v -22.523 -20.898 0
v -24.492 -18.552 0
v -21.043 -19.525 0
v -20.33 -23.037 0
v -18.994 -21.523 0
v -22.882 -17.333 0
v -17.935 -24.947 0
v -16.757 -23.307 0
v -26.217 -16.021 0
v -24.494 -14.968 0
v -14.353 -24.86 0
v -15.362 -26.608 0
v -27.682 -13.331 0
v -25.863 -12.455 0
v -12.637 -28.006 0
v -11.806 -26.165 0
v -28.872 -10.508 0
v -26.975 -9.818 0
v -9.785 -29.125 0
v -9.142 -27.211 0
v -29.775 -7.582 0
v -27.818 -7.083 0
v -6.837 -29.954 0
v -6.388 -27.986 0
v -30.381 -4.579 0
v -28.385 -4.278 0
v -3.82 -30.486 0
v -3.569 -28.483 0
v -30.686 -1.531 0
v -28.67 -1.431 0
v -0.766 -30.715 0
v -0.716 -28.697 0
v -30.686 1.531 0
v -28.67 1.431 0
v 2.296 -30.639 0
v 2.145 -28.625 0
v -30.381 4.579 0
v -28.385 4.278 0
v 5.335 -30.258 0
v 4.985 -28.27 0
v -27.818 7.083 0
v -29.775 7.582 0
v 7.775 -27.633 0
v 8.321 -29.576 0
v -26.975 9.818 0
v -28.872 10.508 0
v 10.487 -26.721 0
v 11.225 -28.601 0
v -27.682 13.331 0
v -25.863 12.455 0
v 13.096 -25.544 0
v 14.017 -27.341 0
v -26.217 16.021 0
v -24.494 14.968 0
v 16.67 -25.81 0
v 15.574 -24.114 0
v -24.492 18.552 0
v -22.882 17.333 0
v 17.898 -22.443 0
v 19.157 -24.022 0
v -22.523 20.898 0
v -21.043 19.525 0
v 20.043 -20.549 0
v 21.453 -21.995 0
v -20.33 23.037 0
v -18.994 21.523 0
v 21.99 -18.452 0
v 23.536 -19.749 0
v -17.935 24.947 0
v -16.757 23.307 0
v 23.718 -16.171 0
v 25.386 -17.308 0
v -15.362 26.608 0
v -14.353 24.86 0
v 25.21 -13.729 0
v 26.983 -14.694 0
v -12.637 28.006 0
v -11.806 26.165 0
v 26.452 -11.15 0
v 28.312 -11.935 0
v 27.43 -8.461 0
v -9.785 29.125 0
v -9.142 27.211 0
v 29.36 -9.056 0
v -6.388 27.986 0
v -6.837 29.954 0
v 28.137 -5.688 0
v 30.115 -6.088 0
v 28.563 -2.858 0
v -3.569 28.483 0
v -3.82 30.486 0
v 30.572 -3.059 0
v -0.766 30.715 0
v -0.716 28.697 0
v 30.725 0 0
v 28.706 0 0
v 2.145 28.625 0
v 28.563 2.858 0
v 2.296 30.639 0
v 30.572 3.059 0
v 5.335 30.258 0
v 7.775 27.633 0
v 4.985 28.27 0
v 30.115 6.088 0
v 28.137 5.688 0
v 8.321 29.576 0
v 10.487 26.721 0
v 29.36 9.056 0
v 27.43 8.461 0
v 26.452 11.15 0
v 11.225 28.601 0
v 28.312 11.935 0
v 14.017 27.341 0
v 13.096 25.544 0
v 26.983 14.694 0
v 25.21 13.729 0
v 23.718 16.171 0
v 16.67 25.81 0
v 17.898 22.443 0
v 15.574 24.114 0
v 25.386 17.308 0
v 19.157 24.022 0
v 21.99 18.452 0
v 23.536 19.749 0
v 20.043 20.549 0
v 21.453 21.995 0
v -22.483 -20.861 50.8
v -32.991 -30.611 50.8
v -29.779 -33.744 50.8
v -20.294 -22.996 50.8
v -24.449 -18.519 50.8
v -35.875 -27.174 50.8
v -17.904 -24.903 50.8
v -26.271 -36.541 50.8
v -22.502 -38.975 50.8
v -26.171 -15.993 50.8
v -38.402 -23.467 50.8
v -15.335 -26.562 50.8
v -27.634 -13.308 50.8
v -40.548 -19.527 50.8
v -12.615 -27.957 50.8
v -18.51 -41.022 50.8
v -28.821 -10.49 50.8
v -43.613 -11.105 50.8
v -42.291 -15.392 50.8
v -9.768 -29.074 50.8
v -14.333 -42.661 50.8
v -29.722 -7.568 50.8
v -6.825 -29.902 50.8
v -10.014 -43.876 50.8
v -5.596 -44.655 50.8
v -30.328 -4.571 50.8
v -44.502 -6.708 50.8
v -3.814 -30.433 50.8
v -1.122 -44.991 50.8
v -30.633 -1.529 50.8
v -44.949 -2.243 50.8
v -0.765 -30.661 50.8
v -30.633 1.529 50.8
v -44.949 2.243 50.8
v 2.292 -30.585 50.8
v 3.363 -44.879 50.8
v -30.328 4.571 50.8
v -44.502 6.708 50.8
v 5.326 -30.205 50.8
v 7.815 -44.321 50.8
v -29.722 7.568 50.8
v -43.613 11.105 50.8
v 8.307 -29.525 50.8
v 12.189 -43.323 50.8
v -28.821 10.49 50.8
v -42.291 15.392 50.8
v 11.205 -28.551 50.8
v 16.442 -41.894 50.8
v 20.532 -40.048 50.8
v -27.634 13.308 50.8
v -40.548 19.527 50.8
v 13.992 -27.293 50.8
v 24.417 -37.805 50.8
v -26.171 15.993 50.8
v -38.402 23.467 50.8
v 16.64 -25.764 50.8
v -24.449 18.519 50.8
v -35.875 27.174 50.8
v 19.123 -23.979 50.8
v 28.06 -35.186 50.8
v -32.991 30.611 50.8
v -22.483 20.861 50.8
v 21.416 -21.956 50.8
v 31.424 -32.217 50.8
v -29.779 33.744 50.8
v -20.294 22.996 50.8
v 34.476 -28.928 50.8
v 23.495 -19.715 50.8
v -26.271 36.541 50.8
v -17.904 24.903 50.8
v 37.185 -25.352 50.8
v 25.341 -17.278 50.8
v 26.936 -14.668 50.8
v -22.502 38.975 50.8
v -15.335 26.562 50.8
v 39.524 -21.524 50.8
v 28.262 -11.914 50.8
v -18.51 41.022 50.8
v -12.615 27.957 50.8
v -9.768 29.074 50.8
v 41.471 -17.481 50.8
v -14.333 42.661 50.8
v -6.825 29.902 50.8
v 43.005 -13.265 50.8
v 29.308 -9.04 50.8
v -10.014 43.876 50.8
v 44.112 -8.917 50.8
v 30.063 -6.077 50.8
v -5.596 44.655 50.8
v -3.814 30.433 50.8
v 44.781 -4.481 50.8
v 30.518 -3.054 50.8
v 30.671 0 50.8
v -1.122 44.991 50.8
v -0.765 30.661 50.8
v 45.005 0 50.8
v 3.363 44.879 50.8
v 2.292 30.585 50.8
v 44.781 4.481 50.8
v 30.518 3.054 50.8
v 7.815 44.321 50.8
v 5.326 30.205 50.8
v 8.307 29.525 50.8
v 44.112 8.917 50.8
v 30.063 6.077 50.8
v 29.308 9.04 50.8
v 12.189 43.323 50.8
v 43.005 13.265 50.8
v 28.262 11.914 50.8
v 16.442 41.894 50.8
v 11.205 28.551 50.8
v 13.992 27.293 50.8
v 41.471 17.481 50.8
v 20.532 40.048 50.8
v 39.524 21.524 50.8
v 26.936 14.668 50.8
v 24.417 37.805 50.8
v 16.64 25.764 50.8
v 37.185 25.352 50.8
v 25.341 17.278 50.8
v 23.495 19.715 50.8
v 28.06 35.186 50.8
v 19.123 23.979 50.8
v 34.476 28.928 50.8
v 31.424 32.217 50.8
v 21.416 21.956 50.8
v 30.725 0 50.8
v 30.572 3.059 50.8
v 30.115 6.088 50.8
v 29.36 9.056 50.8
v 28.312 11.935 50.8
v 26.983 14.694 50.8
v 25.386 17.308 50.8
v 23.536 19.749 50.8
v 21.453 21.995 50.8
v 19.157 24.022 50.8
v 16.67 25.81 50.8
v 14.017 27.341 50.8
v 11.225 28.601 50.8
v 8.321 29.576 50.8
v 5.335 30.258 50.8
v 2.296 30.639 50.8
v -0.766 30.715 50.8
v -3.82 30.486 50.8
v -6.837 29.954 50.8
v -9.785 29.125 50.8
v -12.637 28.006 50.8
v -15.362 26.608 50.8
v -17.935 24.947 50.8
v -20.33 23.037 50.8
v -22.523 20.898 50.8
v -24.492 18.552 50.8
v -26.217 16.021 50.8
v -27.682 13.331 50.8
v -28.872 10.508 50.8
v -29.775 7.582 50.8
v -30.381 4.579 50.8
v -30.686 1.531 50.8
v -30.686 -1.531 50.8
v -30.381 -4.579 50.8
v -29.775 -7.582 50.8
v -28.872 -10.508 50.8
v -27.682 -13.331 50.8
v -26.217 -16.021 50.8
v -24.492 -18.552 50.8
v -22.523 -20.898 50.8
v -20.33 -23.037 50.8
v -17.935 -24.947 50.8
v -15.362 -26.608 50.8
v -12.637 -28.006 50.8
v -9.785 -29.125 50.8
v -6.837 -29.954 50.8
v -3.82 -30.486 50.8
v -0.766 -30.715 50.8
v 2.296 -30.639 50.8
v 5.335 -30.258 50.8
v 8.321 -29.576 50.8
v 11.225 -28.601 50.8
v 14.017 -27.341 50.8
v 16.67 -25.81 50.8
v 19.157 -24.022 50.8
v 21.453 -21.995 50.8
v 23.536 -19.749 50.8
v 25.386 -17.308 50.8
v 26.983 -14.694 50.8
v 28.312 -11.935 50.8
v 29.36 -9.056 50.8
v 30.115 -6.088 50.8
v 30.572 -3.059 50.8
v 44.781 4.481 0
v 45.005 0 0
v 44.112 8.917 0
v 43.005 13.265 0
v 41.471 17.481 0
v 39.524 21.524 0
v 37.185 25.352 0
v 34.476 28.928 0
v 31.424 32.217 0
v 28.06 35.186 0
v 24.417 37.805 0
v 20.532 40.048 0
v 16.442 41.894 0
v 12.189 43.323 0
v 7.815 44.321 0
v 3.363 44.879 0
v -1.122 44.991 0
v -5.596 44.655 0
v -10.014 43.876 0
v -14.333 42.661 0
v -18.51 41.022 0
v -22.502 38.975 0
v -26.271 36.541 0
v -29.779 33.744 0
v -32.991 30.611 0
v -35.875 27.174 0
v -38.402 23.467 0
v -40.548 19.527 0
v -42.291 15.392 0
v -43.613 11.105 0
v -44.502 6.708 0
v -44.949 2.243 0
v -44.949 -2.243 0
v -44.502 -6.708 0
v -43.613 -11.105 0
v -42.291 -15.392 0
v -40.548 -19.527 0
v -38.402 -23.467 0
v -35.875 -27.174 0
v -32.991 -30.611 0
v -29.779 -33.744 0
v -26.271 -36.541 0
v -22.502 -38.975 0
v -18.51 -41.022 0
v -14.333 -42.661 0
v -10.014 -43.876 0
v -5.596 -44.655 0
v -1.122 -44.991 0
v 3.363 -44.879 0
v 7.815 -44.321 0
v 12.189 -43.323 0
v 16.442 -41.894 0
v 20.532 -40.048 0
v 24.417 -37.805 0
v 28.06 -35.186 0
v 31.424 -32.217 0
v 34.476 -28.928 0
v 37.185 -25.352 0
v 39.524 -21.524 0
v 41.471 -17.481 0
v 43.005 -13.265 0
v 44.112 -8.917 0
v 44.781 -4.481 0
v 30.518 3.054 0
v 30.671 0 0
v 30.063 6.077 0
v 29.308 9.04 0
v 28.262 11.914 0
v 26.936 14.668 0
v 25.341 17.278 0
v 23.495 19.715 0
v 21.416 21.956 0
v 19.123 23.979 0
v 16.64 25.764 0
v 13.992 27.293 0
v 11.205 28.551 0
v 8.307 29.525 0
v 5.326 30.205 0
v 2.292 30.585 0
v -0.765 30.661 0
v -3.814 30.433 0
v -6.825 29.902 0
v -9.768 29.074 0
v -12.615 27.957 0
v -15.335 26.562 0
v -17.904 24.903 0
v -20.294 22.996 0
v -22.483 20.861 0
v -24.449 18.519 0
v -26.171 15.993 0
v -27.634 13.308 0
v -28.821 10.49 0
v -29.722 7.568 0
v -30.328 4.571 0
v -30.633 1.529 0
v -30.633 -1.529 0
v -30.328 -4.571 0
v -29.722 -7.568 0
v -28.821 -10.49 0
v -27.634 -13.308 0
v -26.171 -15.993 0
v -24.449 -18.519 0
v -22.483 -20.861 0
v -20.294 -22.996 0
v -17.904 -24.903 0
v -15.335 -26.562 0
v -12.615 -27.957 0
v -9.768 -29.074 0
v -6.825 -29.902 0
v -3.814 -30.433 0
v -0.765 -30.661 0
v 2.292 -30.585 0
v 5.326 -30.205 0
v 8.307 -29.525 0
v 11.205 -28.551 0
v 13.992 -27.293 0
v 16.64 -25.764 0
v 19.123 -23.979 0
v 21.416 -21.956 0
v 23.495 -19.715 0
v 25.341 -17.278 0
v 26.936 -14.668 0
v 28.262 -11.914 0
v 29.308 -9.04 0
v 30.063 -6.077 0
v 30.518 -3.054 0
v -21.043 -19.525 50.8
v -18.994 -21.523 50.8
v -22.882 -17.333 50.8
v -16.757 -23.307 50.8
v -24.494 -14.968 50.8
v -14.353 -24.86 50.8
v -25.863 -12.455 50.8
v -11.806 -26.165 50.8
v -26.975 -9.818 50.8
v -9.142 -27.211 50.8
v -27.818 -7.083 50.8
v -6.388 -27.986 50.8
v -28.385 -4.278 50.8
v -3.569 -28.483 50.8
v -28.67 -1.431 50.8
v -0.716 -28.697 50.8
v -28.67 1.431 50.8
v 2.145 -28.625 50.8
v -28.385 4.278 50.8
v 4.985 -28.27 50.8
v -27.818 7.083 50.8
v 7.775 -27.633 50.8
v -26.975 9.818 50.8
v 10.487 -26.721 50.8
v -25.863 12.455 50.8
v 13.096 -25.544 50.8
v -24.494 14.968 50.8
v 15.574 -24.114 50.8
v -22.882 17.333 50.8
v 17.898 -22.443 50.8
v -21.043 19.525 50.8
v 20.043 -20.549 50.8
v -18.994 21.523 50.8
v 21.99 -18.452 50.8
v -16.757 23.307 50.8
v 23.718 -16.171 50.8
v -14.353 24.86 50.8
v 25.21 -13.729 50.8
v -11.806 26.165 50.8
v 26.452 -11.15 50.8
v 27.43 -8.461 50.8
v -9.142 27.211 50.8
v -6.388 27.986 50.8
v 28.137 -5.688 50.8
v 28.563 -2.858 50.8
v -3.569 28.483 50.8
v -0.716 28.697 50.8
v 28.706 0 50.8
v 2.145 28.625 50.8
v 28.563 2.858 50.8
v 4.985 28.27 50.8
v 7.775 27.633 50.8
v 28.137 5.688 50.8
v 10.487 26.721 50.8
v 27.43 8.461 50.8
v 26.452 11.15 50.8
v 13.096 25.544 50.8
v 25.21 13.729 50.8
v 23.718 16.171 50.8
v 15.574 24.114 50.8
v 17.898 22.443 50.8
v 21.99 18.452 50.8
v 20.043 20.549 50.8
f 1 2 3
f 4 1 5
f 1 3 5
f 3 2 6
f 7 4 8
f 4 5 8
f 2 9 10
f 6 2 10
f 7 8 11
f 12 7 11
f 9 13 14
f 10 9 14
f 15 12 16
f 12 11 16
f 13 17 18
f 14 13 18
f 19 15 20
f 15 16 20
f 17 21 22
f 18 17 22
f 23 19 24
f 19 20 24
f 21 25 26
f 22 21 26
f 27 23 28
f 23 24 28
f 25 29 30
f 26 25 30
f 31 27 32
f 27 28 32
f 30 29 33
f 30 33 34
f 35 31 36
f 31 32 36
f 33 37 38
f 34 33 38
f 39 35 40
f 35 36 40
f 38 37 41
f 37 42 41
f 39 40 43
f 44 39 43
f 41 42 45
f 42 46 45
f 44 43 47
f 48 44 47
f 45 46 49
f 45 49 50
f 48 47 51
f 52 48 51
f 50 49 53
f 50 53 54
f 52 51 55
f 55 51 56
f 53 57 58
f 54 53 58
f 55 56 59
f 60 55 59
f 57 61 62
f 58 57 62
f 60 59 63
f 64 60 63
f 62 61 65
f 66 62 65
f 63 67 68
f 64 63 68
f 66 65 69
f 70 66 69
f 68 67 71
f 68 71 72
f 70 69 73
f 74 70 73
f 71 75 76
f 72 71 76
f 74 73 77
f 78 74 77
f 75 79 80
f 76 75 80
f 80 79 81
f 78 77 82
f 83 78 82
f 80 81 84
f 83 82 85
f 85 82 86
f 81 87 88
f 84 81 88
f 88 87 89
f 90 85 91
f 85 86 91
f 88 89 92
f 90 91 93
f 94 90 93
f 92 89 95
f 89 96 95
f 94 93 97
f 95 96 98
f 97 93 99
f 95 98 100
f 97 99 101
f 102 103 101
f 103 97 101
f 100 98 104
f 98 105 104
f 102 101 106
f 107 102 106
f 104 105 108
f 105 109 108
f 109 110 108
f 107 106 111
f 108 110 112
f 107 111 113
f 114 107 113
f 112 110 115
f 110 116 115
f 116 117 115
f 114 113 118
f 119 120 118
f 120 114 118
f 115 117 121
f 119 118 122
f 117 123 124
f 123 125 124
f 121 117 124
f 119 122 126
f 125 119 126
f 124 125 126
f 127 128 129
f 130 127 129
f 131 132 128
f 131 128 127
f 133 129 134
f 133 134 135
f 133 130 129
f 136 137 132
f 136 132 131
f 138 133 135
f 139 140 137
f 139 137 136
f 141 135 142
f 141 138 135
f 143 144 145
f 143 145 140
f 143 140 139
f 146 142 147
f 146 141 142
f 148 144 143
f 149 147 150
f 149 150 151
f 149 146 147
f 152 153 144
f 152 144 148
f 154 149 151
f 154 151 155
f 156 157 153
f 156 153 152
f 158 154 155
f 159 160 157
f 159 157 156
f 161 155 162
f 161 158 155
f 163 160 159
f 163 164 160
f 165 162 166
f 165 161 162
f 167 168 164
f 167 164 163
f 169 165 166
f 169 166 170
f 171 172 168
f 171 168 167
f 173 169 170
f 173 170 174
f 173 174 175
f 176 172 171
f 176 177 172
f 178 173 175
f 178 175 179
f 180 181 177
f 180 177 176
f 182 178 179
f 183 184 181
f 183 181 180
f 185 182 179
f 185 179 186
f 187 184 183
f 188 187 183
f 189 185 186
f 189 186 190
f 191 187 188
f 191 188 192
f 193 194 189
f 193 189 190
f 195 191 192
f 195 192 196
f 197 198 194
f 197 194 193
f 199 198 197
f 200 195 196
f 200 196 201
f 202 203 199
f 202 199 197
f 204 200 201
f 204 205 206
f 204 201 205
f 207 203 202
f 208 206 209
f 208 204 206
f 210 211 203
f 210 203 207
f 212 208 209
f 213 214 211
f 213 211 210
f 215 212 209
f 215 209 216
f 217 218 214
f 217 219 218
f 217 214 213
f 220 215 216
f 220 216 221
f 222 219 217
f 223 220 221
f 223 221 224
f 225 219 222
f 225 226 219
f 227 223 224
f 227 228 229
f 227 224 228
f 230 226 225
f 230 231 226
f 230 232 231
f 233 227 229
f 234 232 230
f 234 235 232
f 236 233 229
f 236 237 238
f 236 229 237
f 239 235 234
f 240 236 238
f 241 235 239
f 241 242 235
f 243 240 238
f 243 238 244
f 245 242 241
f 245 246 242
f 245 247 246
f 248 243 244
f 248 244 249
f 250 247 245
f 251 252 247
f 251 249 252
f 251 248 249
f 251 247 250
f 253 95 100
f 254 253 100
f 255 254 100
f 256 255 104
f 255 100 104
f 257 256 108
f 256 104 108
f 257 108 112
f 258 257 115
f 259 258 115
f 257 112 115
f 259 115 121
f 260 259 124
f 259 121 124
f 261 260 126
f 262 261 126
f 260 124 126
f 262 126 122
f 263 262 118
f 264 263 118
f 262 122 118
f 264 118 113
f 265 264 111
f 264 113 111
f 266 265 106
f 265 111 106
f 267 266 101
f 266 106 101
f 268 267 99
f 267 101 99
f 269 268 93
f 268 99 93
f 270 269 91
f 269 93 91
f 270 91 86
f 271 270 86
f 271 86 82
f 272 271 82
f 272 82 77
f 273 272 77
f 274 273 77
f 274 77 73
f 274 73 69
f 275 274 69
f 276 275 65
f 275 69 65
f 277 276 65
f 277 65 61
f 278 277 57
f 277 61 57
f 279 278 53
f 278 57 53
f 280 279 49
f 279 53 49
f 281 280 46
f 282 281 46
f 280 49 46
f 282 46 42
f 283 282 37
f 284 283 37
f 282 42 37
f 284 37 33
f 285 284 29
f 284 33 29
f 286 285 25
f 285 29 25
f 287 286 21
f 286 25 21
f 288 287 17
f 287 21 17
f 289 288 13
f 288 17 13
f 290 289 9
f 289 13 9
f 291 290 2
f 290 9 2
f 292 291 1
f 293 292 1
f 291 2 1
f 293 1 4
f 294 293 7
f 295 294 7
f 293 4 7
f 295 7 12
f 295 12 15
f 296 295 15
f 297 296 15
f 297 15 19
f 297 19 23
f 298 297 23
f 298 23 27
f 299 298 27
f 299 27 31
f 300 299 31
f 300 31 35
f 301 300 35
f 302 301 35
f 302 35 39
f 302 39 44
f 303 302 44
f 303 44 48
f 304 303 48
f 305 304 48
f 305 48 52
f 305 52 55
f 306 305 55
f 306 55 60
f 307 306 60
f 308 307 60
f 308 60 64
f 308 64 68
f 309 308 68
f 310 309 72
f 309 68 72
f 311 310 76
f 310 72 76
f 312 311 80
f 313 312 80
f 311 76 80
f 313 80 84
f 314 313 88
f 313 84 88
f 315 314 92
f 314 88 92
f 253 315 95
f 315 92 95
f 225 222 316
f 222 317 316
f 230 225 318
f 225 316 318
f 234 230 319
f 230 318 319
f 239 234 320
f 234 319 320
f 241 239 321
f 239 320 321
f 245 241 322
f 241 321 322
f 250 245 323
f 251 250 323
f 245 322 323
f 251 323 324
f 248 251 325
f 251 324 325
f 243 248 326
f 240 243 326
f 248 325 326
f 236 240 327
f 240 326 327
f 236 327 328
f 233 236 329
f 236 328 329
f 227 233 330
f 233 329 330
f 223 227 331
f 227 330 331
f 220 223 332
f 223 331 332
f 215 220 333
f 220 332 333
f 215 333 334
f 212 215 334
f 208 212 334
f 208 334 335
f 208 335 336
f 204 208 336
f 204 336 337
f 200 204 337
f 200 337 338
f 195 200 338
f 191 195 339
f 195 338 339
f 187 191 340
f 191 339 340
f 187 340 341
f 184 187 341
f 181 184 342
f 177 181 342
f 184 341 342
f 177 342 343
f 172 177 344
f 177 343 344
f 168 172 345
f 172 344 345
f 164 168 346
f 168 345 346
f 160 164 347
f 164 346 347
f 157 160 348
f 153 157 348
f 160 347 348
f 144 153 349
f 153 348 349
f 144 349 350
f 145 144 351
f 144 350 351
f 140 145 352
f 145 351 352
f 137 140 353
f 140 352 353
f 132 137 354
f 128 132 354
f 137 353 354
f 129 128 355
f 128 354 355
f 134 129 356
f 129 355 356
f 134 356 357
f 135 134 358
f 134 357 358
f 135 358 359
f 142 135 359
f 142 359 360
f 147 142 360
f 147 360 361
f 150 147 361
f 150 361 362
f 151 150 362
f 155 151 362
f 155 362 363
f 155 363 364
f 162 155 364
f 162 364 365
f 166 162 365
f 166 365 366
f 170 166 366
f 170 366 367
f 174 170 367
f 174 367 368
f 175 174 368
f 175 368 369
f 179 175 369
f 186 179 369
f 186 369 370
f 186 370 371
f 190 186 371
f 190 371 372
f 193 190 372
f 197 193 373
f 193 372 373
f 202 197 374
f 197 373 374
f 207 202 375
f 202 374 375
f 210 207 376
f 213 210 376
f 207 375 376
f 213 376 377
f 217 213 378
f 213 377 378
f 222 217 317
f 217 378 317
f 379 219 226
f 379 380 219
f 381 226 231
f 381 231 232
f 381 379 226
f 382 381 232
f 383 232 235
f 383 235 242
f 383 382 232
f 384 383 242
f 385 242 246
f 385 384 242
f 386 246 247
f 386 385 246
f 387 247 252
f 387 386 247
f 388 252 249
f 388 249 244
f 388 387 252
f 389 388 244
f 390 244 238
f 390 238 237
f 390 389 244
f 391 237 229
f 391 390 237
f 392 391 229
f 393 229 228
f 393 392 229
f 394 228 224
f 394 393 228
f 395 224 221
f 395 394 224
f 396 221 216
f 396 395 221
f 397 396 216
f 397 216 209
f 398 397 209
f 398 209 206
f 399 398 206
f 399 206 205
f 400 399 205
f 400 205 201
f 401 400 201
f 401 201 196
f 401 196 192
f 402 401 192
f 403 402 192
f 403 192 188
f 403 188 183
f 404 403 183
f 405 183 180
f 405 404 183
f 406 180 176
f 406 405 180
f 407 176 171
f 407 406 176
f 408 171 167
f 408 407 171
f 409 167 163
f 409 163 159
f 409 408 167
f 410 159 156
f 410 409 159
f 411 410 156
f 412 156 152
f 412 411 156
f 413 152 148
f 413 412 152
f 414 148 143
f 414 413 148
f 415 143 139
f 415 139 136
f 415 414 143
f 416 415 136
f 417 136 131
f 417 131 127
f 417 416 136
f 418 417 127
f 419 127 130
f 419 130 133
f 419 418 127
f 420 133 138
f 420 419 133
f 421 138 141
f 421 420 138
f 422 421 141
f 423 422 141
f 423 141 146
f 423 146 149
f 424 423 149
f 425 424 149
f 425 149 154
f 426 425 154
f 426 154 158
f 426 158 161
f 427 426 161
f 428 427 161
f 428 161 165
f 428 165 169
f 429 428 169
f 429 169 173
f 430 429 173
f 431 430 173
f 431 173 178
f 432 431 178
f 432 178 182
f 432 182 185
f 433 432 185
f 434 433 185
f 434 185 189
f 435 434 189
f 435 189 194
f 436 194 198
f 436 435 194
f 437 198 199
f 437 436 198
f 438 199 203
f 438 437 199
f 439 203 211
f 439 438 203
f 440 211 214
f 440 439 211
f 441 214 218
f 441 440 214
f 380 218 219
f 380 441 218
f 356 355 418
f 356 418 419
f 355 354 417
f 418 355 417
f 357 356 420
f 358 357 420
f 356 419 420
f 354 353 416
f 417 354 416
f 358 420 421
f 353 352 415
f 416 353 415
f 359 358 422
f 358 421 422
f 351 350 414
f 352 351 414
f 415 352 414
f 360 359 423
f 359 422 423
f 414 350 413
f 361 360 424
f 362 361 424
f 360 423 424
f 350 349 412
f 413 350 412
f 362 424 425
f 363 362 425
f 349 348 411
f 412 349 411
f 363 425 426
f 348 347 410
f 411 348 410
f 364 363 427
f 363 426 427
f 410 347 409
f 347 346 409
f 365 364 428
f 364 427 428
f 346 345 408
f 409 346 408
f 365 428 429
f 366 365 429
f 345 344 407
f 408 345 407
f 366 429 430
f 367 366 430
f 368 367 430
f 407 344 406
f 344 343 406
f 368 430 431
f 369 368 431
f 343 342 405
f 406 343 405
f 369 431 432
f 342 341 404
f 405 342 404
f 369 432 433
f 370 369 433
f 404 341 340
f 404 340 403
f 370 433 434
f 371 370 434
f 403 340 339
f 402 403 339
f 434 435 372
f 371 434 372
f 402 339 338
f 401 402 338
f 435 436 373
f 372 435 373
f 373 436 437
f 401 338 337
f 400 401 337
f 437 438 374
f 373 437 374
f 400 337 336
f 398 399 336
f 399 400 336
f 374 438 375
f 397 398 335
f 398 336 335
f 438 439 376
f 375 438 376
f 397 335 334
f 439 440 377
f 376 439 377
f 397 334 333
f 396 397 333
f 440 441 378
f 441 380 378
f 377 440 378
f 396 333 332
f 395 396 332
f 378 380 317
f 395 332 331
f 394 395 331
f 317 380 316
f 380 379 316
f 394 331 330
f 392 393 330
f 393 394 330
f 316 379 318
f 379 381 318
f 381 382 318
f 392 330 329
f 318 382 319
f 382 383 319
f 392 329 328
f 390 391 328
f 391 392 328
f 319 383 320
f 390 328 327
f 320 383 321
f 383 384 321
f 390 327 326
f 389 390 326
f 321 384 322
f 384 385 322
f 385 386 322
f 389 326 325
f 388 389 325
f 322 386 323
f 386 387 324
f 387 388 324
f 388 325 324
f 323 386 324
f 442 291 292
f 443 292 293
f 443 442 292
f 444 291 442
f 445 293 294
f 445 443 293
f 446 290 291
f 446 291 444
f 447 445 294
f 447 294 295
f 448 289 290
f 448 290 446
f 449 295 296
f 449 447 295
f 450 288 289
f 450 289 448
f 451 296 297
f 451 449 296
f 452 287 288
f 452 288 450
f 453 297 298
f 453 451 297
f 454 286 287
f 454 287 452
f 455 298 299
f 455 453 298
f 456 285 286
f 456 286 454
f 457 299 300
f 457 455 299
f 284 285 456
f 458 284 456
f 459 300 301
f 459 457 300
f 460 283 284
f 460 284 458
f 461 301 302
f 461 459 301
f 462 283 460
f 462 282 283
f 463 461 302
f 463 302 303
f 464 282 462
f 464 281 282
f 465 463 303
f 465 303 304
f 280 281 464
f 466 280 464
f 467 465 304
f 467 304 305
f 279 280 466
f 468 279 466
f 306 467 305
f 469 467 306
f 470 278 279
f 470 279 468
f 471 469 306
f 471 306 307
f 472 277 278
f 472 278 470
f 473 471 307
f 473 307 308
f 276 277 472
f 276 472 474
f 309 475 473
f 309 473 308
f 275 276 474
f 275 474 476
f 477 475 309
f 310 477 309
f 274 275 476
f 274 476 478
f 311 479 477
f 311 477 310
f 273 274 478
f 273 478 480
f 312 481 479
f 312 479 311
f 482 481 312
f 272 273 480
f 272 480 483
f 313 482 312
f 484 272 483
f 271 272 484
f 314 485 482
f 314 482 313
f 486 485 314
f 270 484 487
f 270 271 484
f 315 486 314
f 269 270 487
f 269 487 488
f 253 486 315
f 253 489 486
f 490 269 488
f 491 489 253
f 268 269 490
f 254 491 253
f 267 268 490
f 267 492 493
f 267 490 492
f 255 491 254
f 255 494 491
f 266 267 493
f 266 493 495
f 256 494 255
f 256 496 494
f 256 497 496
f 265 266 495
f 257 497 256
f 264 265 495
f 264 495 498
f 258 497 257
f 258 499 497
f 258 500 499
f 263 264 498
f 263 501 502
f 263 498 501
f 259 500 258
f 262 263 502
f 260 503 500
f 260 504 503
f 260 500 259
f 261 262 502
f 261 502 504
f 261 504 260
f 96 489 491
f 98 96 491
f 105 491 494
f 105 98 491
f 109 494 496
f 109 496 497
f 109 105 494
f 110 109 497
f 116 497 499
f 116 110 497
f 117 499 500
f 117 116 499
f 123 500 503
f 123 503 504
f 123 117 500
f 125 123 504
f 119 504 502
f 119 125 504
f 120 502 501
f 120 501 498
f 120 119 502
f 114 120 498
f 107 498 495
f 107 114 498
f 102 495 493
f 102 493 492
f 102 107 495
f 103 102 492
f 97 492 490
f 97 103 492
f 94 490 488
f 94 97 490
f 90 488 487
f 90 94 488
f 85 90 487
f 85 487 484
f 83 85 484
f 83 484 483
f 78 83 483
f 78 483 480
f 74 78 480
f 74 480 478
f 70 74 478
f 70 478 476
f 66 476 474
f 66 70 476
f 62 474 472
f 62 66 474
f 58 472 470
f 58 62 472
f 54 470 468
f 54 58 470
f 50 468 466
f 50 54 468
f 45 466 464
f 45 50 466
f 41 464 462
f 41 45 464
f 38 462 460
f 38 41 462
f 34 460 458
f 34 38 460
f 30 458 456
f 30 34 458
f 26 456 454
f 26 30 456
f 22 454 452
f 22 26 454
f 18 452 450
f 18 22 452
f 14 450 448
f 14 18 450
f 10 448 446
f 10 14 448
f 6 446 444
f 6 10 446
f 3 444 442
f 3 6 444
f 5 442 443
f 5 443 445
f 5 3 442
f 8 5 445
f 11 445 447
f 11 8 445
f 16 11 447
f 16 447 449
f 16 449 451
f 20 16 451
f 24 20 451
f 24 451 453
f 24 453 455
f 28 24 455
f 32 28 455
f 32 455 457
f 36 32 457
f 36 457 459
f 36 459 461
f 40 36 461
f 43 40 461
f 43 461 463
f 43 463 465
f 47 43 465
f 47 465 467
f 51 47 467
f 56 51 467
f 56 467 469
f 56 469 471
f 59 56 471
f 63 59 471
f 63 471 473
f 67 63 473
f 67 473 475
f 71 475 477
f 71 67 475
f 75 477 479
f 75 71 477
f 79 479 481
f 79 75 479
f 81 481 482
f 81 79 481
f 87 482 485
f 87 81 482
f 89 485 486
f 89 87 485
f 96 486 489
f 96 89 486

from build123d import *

# Parameters (mm, degrees)
F0_R        = 45.004612
F0_R_2      = 30.670883
F1_DEPTH    = 25.4
F1_FACE_R   = 45.004612
F1_FACE_R_2 = 30.670883
F2_DEPTH    = 25.4
F3_R        = 30.724669
F3_R_2      = 28.705733
F4_DEPTH    = 50.8


with BuildPart() as f1:
    # F0 (on Top) → F1 (new body)
    with BuildSketch(Plane.XY):
        Circle(F0_R)
        Circle(F0_R_2, mode=Mode.SUBTRACT)
    extrude(amount=F1_DEPTH)

    # F1_face (on face) → F2 (join)
    with BuildSketch(Plane.XY.offset(25.4)):
        Circle(F1_FACE_R)
        Circle(F1_FACE_R_2, mode=Mode.SUBTRACT)
    extrude(amount=F2_DEPTH)


with BuildPart() as f4:
    # F3 (on Top) → F4 (new body)
    with BuildSketch(Plane.XY):
        Circle(F3_R)
        Circle(F3_R_2, mode=Mode.SUBTRACT)
    extrude(amount=F4_DEPTH)


solid = Compound([f1.part, f4.part])
